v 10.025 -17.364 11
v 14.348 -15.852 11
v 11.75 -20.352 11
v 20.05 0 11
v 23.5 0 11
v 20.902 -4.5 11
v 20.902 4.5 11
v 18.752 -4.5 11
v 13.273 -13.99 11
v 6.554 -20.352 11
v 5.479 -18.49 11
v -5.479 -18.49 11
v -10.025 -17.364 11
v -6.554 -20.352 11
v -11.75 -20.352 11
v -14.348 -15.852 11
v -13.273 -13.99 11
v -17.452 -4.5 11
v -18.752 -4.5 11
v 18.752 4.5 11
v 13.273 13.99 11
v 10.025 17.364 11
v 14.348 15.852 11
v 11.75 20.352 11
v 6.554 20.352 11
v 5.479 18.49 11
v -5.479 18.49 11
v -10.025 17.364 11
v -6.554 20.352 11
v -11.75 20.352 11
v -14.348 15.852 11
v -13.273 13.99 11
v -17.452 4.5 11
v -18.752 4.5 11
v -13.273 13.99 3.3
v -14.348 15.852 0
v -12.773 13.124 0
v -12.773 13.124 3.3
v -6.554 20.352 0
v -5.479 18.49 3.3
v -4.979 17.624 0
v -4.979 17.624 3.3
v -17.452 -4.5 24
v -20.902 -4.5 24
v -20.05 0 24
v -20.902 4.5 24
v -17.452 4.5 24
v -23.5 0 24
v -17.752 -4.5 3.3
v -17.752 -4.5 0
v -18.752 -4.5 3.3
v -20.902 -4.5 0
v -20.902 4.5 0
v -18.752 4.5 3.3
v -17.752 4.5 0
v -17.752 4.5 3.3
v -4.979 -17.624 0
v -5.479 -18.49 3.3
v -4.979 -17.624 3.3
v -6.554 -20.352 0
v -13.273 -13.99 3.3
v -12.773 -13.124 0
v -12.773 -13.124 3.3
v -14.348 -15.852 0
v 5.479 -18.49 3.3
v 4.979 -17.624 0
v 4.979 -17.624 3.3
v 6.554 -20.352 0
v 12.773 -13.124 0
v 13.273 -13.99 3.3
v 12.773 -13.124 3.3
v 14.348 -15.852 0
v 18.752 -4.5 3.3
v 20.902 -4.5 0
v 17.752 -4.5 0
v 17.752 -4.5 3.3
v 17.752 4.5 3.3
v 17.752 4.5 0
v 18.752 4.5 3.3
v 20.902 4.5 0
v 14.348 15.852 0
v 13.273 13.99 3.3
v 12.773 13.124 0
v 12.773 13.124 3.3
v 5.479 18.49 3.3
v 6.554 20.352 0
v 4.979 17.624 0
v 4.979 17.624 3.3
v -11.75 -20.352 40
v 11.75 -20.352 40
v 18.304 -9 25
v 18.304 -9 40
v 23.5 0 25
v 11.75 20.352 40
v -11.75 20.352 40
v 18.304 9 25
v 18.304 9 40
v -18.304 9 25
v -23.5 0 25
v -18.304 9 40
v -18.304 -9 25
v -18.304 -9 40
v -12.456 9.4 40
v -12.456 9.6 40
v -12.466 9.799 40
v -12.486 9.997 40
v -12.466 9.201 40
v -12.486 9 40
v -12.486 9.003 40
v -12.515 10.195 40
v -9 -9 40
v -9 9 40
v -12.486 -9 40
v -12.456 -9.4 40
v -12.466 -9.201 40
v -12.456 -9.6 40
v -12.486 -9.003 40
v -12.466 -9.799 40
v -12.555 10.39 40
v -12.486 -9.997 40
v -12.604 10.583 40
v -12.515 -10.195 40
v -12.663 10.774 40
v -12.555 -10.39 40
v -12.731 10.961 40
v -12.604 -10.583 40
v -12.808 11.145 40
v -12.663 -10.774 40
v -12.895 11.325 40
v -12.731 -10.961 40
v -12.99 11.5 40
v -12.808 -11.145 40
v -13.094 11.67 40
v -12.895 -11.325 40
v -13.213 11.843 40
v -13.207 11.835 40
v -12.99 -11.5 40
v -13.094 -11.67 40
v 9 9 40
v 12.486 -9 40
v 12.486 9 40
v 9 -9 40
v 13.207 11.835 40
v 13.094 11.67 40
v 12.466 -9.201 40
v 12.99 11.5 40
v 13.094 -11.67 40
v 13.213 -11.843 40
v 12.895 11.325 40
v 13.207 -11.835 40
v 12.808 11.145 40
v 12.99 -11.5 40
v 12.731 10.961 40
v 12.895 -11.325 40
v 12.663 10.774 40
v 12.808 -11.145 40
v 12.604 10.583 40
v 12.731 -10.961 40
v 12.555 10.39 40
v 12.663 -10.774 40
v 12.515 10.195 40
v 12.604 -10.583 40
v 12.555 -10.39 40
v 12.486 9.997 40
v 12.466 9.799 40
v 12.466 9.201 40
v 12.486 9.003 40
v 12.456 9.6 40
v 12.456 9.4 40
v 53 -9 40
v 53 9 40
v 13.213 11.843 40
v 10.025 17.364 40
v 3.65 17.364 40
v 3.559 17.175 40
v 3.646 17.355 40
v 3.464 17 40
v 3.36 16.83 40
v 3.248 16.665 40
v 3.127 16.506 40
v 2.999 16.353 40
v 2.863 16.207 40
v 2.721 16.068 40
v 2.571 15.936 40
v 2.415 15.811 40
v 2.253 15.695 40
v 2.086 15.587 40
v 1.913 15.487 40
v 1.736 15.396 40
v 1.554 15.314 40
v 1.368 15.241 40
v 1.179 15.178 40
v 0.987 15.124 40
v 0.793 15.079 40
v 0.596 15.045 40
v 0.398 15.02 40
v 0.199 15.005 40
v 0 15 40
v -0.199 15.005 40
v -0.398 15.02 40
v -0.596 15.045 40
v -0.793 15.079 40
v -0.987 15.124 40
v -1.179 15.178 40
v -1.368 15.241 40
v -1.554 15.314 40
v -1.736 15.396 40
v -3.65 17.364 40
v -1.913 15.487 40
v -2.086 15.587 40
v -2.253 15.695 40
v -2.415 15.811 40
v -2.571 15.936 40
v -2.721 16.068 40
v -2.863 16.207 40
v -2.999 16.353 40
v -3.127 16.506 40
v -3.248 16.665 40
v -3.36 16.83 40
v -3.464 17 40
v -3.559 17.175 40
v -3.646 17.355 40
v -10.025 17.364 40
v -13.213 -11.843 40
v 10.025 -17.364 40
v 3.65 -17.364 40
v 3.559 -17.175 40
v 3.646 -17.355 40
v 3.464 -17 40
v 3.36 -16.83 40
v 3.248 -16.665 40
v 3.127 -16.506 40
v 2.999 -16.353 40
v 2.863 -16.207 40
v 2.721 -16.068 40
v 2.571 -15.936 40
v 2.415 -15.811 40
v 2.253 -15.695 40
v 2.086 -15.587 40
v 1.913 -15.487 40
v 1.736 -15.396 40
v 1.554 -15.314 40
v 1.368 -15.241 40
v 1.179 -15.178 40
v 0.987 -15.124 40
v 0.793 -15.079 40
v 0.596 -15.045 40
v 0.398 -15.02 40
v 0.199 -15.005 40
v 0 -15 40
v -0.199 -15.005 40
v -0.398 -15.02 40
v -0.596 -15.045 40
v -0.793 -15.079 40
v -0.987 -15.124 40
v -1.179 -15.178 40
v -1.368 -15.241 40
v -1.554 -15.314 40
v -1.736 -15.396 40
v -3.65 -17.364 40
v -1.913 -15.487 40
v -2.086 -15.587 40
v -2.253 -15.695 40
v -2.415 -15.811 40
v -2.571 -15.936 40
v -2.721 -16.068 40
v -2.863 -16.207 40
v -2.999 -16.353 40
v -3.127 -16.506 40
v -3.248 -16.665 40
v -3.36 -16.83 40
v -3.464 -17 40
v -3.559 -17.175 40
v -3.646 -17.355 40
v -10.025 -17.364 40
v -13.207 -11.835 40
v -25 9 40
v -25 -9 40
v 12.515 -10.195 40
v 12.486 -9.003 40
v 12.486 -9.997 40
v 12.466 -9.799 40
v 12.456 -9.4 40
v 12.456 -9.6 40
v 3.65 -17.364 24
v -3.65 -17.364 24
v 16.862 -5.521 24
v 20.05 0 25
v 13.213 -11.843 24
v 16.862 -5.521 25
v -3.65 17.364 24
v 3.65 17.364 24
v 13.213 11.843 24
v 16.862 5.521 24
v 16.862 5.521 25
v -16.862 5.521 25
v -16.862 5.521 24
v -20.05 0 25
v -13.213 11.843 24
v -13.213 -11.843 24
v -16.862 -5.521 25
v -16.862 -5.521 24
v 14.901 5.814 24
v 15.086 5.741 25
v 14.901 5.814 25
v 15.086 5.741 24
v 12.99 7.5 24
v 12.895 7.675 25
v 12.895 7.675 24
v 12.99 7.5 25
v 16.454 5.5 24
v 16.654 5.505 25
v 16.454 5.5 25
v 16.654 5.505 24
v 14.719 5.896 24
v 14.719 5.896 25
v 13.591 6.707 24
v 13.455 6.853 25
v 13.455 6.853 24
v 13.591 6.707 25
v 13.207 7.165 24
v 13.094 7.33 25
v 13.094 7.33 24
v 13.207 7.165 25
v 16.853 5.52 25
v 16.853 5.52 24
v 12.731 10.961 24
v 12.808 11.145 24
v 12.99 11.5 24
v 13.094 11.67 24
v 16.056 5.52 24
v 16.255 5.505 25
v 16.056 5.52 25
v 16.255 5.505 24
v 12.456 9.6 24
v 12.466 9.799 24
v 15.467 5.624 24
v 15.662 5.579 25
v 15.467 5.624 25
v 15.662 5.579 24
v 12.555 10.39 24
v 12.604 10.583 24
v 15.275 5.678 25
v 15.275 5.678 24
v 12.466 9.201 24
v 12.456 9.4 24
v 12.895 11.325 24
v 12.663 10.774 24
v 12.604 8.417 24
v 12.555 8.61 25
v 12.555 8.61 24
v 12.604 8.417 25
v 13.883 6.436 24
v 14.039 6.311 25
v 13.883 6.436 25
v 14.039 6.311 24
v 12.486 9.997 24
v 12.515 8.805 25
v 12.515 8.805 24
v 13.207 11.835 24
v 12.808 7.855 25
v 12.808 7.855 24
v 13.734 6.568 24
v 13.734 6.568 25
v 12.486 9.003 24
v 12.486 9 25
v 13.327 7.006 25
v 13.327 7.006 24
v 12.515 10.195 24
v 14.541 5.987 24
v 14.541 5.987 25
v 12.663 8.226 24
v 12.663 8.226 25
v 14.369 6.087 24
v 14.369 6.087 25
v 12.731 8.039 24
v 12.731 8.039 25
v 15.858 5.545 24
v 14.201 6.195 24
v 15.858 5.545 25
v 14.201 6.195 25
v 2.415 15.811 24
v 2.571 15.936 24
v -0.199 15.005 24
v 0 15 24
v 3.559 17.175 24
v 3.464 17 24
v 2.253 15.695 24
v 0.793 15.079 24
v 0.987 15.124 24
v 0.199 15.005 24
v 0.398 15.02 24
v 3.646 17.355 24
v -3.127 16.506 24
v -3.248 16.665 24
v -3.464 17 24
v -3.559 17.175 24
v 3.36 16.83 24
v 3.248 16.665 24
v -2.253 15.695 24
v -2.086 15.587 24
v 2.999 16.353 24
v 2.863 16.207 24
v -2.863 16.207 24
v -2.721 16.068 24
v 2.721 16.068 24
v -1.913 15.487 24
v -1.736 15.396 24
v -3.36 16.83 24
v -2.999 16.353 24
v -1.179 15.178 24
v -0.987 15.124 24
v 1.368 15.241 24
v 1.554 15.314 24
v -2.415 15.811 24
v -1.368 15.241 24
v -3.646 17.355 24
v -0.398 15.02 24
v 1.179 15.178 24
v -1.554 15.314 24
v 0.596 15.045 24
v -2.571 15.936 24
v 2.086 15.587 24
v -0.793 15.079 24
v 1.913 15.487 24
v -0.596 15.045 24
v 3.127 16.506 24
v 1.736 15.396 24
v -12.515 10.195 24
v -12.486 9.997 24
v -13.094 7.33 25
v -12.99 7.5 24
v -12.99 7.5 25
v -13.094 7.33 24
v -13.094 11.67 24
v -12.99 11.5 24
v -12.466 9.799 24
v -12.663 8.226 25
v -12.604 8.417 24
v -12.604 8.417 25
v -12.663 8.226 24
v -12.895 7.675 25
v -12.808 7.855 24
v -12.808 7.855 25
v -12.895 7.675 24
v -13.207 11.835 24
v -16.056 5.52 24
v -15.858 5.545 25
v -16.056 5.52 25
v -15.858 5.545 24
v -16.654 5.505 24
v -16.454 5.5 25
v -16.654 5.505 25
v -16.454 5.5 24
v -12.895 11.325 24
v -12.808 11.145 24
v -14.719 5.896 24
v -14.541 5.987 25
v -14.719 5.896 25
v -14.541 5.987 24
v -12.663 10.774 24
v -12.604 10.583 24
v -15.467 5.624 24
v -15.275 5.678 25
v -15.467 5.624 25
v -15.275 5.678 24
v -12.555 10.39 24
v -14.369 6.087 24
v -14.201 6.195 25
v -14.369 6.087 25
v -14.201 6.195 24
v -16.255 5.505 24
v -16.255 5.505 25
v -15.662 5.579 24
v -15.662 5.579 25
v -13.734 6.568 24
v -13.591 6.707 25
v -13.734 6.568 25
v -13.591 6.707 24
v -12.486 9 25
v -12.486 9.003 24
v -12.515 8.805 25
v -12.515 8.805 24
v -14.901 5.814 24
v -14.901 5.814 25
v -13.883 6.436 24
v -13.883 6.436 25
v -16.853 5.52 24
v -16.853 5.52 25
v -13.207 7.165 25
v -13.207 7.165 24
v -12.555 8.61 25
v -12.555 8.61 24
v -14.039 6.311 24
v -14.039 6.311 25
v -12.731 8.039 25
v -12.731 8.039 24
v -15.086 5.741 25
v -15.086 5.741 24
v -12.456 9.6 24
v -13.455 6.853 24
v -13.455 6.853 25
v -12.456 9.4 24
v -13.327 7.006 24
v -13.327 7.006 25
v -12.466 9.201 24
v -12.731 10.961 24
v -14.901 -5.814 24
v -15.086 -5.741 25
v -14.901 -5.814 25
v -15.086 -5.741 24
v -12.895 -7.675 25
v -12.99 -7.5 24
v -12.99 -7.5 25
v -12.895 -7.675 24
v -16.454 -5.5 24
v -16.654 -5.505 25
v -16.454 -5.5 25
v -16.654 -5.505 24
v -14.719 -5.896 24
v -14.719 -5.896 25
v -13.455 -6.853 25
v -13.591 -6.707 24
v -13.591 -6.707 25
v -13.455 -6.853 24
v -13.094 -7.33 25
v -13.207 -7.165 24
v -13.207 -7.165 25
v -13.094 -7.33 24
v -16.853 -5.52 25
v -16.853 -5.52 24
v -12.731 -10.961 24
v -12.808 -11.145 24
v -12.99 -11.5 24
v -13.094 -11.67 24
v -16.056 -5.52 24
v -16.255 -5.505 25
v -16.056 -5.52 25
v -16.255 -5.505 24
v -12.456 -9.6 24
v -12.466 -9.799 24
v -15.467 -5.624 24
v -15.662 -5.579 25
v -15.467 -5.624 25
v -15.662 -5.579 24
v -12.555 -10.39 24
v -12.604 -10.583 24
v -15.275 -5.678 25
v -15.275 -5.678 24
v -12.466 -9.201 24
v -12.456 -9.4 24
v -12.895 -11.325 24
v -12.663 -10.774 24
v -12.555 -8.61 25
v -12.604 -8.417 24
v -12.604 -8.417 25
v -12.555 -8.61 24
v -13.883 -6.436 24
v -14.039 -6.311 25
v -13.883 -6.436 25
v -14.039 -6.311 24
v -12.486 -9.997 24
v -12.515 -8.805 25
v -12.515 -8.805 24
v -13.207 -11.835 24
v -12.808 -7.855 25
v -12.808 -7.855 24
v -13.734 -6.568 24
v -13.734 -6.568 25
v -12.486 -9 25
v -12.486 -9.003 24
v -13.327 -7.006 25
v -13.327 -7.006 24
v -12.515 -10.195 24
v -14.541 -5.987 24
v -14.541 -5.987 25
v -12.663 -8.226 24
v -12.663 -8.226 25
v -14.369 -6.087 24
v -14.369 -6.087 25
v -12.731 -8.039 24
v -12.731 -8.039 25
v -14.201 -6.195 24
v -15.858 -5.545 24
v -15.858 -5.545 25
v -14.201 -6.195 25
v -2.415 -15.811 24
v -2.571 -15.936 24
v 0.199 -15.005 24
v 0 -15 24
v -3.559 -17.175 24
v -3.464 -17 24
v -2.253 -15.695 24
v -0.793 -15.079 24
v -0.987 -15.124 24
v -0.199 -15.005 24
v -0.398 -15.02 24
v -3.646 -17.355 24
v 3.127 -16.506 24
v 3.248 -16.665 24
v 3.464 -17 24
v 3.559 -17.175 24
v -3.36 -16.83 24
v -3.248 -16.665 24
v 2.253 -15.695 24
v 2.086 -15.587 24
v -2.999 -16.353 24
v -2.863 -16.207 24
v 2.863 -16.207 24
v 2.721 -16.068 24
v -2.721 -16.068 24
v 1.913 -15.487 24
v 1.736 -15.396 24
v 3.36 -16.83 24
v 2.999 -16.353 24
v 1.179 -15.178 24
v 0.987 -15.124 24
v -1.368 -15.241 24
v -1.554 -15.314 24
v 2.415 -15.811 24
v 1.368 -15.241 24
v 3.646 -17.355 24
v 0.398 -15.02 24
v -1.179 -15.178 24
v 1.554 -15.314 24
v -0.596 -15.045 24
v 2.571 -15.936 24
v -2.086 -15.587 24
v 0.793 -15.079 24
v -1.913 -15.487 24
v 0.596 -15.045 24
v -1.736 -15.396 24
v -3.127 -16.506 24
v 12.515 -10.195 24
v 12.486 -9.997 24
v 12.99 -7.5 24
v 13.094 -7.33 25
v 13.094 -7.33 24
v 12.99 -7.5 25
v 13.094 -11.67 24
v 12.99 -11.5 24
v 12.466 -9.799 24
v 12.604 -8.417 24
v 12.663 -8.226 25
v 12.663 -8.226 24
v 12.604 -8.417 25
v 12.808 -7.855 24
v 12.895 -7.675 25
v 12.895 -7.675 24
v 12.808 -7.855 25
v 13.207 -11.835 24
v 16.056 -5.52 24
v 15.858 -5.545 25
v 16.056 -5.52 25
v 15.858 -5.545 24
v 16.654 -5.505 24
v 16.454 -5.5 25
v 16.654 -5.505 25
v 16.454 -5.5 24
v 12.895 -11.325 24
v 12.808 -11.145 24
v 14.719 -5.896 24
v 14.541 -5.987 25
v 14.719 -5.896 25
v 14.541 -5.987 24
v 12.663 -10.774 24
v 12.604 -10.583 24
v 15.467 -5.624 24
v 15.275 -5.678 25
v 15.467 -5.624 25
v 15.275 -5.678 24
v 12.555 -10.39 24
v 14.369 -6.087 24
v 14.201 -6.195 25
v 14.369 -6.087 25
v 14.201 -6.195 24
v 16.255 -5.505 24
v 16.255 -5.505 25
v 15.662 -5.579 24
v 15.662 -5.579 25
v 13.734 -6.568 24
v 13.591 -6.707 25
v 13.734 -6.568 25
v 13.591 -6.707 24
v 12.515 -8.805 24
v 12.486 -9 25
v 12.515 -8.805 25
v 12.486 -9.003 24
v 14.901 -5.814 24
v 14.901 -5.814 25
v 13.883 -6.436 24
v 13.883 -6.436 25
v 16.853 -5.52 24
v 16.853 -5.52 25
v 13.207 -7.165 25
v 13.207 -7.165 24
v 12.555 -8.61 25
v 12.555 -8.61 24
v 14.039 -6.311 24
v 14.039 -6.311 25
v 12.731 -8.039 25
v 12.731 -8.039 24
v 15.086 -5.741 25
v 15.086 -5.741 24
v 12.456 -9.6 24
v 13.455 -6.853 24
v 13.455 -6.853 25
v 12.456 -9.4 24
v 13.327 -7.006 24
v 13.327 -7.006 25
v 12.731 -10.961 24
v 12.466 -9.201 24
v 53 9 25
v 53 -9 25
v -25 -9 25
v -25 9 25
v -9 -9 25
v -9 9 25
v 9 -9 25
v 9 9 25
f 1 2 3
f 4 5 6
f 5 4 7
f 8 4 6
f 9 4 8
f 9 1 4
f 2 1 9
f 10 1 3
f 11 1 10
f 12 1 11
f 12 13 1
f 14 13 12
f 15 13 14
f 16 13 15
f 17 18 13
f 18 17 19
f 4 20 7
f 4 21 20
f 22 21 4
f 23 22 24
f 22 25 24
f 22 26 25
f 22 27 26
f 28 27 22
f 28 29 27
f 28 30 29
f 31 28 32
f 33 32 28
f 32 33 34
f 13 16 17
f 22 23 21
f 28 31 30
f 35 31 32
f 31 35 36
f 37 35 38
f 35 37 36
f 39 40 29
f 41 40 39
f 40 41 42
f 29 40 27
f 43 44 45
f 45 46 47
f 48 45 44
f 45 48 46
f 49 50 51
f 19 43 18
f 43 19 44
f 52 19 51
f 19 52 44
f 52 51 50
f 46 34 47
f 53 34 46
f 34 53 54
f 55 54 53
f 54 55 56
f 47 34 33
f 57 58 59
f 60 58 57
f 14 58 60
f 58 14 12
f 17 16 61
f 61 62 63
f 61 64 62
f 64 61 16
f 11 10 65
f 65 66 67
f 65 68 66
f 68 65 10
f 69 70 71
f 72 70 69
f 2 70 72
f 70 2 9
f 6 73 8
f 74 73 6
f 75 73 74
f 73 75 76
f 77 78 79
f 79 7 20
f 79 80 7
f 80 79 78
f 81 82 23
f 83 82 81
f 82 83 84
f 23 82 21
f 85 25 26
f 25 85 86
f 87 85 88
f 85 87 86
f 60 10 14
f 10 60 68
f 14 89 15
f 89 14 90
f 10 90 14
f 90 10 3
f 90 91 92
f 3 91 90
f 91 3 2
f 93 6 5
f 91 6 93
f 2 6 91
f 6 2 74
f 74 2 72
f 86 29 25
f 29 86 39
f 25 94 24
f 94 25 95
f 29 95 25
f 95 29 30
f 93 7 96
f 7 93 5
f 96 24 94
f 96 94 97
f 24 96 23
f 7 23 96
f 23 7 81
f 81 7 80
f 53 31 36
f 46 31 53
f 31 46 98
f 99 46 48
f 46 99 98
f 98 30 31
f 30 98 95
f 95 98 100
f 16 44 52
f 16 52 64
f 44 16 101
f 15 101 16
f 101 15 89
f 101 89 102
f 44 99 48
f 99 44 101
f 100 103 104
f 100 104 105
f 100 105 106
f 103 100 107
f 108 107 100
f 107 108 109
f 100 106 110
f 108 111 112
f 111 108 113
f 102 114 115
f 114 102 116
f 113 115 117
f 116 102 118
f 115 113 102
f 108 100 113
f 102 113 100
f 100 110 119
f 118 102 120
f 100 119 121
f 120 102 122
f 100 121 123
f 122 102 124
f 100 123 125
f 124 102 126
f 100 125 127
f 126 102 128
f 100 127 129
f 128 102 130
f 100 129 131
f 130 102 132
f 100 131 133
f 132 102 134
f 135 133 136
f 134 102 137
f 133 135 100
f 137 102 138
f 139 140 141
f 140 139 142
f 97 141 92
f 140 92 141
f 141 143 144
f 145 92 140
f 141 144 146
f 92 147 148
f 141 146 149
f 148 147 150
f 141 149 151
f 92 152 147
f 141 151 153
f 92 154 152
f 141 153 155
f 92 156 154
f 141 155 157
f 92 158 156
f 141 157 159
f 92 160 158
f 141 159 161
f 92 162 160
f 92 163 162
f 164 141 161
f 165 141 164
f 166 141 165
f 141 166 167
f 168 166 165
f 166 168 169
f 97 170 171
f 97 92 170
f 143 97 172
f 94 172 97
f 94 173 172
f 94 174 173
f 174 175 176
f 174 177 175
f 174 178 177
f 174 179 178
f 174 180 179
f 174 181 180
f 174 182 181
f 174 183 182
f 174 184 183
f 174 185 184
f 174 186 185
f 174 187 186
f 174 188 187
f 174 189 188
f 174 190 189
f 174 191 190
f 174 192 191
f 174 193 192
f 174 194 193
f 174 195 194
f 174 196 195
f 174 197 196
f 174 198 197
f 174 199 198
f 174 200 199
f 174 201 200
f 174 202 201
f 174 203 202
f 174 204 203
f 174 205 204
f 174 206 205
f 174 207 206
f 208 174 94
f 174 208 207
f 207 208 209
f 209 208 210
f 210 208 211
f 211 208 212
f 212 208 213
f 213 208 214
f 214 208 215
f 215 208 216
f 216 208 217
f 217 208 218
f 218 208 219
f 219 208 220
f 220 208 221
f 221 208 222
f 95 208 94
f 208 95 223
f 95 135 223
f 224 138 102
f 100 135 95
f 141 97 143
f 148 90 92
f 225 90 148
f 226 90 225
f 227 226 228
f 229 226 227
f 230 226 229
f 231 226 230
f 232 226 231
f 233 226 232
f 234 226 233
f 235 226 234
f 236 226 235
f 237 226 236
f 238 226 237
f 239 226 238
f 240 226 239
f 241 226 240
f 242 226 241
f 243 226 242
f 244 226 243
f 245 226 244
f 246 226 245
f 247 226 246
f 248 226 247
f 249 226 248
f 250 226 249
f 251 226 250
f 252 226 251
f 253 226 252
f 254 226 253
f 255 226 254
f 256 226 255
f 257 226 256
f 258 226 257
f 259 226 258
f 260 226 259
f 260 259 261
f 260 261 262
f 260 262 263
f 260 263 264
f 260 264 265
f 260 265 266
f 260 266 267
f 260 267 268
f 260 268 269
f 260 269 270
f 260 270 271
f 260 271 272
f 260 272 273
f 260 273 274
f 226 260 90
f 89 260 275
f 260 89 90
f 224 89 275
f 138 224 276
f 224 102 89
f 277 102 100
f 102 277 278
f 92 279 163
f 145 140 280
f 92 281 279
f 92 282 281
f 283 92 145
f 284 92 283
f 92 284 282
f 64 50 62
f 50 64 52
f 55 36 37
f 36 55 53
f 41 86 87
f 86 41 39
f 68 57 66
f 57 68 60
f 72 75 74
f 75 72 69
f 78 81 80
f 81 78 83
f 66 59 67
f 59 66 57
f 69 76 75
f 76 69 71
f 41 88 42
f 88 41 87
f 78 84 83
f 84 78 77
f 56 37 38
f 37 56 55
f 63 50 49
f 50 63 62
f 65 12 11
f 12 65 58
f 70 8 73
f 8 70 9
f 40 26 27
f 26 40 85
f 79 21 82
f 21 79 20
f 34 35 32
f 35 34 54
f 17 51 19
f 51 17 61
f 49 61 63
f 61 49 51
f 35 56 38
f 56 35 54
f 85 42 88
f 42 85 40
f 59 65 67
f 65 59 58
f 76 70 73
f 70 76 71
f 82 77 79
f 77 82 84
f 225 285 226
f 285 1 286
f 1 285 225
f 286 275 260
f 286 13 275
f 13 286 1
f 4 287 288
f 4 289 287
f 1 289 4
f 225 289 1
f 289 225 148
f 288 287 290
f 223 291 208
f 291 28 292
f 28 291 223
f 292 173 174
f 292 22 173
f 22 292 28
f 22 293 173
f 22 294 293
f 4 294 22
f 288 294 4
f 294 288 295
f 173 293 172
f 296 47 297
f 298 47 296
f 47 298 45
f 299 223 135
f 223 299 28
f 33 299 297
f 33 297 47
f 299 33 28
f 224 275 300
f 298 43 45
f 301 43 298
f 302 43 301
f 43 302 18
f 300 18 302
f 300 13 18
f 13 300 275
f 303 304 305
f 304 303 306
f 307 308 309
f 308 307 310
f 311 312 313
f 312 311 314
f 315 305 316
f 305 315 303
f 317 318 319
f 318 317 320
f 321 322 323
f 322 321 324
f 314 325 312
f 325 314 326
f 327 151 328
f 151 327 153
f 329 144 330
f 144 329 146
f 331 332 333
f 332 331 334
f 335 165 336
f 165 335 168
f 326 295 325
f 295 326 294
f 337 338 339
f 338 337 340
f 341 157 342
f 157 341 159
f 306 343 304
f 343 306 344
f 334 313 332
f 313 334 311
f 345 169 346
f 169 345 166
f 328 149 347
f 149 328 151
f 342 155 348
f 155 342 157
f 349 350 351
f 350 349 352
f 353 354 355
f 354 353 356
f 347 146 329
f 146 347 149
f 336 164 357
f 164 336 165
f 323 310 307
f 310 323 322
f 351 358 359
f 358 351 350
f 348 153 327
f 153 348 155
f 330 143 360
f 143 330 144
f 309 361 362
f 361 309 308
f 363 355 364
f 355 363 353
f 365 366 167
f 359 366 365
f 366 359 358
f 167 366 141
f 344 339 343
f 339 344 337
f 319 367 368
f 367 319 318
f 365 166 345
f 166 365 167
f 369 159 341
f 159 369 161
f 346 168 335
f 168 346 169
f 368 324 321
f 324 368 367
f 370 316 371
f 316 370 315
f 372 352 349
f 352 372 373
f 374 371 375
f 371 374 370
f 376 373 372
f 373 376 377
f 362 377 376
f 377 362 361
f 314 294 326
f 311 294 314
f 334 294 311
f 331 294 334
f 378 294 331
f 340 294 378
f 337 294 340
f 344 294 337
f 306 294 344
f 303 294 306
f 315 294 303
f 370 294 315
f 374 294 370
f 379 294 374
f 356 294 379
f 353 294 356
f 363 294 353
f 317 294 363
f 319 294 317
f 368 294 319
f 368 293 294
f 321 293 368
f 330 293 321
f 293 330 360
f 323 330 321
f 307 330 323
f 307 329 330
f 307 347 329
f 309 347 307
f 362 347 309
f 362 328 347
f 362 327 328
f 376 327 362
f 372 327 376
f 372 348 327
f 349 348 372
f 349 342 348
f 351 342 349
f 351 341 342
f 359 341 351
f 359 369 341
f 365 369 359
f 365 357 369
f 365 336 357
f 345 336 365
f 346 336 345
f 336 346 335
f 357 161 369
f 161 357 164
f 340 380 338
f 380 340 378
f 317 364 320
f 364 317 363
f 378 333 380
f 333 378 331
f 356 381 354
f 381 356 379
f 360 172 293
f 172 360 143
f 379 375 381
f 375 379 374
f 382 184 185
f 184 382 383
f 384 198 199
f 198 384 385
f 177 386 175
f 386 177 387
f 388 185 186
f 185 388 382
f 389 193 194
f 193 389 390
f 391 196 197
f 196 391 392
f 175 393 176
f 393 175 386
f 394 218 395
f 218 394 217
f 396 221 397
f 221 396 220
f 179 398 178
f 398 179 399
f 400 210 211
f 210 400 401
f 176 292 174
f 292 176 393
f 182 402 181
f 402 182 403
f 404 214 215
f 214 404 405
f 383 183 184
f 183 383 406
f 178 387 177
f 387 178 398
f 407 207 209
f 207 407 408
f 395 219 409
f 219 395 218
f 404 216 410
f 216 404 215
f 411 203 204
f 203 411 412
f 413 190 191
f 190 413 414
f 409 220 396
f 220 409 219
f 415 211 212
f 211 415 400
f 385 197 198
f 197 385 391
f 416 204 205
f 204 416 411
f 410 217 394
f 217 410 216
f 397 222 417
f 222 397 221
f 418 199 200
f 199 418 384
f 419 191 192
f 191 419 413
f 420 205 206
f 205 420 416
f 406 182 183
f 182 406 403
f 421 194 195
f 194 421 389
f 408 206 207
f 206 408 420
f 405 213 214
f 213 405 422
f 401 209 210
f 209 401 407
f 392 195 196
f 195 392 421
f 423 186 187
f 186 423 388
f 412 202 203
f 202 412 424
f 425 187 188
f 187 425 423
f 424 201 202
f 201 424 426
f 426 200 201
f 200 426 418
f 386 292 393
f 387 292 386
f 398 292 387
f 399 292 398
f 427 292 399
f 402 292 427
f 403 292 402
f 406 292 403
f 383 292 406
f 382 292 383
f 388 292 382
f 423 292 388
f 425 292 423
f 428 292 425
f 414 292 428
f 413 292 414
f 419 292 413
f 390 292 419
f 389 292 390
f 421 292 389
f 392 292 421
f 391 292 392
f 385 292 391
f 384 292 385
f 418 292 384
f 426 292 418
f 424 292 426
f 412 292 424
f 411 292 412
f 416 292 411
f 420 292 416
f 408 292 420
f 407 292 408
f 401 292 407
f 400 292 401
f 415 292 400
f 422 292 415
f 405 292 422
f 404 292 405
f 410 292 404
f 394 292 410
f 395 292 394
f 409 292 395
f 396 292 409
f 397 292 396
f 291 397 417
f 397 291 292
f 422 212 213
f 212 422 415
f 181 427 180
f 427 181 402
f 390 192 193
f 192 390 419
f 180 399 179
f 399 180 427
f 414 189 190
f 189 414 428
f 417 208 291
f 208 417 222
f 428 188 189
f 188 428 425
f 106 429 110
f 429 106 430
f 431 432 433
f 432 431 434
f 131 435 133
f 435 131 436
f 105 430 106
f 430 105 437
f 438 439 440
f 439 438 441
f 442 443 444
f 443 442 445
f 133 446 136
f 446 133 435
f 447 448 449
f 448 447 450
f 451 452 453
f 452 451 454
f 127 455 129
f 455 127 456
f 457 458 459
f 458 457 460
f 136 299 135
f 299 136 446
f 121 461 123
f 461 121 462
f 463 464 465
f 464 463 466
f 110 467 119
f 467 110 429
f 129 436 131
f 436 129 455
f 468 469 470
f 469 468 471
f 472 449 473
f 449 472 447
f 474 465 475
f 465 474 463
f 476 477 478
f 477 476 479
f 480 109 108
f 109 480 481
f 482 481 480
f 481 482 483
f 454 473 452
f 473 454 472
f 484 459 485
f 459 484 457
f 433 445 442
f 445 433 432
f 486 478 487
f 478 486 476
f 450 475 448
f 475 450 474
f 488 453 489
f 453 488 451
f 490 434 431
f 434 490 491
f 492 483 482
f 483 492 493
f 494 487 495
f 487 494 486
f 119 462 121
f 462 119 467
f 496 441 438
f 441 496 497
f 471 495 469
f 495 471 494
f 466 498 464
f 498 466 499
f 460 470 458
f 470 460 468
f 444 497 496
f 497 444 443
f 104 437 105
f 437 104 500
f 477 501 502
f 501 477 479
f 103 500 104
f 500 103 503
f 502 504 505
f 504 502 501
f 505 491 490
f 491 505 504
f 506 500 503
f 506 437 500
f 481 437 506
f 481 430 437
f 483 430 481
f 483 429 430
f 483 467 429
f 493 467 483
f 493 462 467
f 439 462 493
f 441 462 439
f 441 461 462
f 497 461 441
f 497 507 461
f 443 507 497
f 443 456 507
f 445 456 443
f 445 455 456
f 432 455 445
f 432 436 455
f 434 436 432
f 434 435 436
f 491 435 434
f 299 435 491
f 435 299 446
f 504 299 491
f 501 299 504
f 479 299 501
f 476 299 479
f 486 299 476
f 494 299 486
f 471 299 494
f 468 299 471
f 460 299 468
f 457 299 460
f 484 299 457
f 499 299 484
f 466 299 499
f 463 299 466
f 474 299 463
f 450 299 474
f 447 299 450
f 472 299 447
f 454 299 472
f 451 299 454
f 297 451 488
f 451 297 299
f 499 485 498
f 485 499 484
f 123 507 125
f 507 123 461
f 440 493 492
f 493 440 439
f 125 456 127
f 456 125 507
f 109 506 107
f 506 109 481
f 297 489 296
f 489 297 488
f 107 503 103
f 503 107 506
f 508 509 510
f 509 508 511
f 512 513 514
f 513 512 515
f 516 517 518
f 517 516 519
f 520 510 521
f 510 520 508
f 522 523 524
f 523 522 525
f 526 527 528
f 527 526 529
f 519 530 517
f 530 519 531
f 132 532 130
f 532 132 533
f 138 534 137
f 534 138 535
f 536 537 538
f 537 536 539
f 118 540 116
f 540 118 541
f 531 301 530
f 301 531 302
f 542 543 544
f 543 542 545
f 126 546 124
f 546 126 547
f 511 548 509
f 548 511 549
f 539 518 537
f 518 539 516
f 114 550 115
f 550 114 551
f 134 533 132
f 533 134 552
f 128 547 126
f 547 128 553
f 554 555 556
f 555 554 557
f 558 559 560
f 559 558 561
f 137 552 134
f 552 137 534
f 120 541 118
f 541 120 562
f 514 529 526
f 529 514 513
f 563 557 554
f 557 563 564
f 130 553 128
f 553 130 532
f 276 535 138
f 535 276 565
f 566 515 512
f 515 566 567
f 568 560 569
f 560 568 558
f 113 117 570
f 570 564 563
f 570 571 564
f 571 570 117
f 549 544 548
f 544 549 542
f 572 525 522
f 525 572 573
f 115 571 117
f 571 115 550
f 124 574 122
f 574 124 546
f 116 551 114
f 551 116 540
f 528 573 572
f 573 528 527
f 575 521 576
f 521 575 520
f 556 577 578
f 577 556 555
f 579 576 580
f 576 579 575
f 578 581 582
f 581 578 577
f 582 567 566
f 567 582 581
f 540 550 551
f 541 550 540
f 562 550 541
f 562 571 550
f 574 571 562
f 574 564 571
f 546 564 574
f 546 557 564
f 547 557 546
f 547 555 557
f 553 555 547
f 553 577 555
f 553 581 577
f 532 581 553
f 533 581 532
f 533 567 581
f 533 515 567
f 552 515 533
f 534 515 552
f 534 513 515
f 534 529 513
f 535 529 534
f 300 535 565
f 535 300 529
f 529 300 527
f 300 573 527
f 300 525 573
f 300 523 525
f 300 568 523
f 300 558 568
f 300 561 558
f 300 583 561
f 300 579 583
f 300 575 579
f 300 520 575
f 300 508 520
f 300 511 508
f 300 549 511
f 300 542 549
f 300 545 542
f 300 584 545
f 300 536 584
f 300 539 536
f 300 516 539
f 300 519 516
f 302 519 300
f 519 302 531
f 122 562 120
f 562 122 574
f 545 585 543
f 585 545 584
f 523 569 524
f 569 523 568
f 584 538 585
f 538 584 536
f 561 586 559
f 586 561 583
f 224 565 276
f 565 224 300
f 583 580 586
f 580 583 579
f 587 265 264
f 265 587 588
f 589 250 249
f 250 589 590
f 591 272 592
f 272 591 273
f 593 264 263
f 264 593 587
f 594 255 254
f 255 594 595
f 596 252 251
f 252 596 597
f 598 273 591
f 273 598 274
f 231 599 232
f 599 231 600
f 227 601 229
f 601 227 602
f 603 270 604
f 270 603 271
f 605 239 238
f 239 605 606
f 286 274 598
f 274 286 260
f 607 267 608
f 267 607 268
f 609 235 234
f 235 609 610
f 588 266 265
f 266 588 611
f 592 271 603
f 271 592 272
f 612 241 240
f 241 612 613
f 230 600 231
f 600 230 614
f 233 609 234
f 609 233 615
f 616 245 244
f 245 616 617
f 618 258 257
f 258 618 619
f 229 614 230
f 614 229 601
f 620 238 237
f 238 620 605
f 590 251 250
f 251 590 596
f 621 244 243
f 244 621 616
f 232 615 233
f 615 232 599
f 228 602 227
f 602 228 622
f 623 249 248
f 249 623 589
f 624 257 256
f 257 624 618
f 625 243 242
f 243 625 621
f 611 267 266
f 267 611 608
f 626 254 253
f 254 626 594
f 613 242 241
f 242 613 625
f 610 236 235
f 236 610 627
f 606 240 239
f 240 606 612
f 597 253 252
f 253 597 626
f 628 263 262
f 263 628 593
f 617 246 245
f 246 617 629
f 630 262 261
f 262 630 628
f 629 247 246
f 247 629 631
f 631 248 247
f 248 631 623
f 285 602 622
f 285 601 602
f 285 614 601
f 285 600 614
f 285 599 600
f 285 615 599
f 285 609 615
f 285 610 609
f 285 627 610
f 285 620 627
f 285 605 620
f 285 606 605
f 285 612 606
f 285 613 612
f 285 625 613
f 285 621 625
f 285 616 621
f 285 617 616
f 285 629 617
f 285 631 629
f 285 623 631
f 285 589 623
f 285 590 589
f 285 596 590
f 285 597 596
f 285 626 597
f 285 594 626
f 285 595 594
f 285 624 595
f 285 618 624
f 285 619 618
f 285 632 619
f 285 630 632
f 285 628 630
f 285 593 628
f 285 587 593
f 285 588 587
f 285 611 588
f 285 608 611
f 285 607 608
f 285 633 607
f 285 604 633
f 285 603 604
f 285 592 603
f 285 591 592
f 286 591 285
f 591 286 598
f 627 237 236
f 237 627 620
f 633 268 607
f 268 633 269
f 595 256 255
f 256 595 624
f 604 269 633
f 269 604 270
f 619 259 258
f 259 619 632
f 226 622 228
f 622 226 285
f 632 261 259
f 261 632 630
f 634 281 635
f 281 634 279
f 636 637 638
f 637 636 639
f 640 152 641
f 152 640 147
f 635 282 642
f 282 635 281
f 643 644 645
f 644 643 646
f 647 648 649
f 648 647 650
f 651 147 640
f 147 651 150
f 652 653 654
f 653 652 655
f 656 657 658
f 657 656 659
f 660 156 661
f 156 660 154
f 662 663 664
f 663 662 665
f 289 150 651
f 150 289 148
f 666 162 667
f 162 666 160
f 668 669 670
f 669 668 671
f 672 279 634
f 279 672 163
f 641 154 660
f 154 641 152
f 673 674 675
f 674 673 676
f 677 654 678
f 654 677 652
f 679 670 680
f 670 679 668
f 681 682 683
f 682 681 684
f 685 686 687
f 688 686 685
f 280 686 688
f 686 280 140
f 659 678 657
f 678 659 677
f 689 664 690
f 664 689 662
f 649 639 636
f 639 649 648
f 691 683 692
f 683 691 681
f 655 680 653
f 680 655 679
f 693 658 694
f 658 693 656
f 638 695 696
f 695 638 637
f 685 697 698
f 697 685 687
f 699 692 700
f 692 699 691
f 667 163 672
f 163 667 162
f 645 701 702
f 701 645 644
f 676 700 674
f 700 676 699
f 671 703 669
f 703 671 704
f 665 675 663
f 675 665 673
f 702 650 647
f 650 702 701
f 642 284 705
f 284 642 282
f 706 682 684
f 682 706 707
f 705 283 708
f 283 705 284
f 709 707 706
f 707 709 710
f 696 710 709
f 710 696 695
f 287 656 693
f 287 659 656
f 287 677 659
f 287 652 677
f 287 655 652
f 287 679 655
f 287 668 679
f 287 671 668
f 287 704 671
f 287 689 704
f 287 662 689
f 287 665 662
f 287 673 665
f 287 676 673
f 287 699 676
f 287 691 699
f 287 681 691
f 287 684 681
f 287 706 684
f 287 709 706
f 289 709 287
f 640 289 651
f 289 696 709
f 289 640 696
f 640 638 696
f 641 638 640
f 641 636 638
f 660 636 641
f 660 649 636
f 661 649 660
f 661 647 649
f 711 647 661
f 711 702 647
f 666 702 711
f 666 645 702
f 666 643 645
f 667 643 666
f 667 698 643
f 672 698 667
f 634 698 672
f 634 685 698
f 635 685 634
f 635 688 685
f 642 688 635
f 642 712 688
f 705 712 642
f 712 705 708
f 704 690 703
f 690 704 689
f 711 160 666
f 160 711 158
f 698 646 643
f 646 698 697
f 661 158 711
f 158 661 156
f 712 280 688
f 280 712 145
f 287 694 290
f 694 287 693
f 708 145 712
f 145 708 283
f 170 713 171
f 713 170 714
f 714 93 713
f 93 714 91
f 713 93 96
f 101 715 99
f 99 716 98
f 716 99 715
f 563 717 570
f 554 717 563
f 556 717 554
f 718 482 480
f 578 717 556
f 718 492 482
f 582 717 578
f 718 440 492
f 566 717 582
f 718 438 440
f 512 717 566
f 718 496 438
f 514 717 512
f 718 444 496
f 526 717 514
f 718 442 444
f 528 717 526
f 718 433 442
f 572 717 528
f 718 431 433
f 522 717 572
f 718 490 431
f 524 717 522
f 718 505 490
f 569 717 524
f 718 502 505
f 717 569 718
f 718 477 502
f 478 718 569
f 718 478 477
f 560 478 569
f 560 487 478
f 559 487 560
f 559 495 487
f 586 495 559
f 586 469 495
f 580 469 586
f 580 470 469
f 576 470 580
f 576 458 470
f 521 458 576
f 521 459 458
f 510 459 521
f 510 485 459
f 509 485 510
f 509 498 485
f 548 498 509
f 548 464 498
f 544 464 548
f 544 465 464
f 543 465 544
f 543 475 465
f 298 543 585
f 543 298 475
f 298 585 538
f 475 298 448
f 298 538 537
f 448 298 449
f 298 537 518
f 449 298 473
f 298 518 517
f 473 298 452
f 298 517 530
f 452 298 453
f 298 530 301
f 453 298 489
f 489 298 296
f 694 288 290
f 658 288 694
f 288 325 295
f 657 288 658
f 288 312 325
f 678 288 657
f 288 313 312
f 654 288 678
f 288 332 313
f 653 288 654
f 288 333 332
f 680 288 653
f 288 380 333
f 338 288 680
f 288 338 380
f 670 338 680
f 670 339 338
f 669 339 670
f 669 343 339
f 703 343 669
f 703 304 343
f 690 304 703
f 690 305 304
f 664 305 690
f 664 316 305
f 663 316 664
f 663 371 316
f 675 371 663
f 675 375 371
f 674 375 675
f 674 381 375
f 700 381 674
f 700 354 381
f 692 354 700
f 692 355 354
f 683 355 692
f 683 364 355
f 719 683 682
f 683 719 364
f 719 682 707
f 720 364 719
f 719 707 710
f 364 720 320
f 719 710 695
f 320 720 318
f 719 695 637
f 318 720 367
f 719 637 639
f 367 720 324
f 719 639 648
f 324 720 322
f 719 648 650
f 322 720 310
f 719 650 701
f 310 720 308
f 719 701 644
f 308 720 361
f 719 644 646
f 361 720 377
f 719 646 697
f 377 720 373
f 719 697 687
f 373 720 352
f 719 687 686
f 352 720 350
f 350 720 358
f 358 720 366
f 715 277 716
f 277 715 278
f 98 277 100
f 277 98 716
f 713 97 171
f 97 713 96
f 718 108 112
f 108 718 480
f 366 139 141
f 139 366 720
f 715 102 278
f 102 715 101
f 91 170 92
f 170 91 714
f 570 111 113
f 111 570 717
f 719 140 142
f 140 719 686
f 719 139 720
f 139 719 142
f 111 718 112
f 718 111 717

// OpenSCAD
$fa=.1;
$fs=.2;

difference() {
    cylinder(h=40, d=47, $fn=6);

    cylinder(h=4, d=45-2.15*2, $fn=6);
    translate([0,0,3.3]) cylinder(h=7.7, d=45-1.15*2, $fn=6);
    translate([0,0,-1]) cylinder(h=42, d=45-2.45*2, $fn=6);
    for(i=[30:60:330]) rotate([0,0,i]) translate([-4.5,0,-1]) cube([9,50,i==90?25:12]);
    
    
}

translate([0,0,24]){
    for(i=[30:60:330]) rotate([0,0,i]) translate([19,0,0]) difference() {
        cylinder(h=16,d=8);
        translate([0,-10,-1]) cube(50);
    }
}

difference() {
    translate([-25,-9,25]) cube([78,18,15]);
    translate([-9,-9,24]) cube(18);
}
